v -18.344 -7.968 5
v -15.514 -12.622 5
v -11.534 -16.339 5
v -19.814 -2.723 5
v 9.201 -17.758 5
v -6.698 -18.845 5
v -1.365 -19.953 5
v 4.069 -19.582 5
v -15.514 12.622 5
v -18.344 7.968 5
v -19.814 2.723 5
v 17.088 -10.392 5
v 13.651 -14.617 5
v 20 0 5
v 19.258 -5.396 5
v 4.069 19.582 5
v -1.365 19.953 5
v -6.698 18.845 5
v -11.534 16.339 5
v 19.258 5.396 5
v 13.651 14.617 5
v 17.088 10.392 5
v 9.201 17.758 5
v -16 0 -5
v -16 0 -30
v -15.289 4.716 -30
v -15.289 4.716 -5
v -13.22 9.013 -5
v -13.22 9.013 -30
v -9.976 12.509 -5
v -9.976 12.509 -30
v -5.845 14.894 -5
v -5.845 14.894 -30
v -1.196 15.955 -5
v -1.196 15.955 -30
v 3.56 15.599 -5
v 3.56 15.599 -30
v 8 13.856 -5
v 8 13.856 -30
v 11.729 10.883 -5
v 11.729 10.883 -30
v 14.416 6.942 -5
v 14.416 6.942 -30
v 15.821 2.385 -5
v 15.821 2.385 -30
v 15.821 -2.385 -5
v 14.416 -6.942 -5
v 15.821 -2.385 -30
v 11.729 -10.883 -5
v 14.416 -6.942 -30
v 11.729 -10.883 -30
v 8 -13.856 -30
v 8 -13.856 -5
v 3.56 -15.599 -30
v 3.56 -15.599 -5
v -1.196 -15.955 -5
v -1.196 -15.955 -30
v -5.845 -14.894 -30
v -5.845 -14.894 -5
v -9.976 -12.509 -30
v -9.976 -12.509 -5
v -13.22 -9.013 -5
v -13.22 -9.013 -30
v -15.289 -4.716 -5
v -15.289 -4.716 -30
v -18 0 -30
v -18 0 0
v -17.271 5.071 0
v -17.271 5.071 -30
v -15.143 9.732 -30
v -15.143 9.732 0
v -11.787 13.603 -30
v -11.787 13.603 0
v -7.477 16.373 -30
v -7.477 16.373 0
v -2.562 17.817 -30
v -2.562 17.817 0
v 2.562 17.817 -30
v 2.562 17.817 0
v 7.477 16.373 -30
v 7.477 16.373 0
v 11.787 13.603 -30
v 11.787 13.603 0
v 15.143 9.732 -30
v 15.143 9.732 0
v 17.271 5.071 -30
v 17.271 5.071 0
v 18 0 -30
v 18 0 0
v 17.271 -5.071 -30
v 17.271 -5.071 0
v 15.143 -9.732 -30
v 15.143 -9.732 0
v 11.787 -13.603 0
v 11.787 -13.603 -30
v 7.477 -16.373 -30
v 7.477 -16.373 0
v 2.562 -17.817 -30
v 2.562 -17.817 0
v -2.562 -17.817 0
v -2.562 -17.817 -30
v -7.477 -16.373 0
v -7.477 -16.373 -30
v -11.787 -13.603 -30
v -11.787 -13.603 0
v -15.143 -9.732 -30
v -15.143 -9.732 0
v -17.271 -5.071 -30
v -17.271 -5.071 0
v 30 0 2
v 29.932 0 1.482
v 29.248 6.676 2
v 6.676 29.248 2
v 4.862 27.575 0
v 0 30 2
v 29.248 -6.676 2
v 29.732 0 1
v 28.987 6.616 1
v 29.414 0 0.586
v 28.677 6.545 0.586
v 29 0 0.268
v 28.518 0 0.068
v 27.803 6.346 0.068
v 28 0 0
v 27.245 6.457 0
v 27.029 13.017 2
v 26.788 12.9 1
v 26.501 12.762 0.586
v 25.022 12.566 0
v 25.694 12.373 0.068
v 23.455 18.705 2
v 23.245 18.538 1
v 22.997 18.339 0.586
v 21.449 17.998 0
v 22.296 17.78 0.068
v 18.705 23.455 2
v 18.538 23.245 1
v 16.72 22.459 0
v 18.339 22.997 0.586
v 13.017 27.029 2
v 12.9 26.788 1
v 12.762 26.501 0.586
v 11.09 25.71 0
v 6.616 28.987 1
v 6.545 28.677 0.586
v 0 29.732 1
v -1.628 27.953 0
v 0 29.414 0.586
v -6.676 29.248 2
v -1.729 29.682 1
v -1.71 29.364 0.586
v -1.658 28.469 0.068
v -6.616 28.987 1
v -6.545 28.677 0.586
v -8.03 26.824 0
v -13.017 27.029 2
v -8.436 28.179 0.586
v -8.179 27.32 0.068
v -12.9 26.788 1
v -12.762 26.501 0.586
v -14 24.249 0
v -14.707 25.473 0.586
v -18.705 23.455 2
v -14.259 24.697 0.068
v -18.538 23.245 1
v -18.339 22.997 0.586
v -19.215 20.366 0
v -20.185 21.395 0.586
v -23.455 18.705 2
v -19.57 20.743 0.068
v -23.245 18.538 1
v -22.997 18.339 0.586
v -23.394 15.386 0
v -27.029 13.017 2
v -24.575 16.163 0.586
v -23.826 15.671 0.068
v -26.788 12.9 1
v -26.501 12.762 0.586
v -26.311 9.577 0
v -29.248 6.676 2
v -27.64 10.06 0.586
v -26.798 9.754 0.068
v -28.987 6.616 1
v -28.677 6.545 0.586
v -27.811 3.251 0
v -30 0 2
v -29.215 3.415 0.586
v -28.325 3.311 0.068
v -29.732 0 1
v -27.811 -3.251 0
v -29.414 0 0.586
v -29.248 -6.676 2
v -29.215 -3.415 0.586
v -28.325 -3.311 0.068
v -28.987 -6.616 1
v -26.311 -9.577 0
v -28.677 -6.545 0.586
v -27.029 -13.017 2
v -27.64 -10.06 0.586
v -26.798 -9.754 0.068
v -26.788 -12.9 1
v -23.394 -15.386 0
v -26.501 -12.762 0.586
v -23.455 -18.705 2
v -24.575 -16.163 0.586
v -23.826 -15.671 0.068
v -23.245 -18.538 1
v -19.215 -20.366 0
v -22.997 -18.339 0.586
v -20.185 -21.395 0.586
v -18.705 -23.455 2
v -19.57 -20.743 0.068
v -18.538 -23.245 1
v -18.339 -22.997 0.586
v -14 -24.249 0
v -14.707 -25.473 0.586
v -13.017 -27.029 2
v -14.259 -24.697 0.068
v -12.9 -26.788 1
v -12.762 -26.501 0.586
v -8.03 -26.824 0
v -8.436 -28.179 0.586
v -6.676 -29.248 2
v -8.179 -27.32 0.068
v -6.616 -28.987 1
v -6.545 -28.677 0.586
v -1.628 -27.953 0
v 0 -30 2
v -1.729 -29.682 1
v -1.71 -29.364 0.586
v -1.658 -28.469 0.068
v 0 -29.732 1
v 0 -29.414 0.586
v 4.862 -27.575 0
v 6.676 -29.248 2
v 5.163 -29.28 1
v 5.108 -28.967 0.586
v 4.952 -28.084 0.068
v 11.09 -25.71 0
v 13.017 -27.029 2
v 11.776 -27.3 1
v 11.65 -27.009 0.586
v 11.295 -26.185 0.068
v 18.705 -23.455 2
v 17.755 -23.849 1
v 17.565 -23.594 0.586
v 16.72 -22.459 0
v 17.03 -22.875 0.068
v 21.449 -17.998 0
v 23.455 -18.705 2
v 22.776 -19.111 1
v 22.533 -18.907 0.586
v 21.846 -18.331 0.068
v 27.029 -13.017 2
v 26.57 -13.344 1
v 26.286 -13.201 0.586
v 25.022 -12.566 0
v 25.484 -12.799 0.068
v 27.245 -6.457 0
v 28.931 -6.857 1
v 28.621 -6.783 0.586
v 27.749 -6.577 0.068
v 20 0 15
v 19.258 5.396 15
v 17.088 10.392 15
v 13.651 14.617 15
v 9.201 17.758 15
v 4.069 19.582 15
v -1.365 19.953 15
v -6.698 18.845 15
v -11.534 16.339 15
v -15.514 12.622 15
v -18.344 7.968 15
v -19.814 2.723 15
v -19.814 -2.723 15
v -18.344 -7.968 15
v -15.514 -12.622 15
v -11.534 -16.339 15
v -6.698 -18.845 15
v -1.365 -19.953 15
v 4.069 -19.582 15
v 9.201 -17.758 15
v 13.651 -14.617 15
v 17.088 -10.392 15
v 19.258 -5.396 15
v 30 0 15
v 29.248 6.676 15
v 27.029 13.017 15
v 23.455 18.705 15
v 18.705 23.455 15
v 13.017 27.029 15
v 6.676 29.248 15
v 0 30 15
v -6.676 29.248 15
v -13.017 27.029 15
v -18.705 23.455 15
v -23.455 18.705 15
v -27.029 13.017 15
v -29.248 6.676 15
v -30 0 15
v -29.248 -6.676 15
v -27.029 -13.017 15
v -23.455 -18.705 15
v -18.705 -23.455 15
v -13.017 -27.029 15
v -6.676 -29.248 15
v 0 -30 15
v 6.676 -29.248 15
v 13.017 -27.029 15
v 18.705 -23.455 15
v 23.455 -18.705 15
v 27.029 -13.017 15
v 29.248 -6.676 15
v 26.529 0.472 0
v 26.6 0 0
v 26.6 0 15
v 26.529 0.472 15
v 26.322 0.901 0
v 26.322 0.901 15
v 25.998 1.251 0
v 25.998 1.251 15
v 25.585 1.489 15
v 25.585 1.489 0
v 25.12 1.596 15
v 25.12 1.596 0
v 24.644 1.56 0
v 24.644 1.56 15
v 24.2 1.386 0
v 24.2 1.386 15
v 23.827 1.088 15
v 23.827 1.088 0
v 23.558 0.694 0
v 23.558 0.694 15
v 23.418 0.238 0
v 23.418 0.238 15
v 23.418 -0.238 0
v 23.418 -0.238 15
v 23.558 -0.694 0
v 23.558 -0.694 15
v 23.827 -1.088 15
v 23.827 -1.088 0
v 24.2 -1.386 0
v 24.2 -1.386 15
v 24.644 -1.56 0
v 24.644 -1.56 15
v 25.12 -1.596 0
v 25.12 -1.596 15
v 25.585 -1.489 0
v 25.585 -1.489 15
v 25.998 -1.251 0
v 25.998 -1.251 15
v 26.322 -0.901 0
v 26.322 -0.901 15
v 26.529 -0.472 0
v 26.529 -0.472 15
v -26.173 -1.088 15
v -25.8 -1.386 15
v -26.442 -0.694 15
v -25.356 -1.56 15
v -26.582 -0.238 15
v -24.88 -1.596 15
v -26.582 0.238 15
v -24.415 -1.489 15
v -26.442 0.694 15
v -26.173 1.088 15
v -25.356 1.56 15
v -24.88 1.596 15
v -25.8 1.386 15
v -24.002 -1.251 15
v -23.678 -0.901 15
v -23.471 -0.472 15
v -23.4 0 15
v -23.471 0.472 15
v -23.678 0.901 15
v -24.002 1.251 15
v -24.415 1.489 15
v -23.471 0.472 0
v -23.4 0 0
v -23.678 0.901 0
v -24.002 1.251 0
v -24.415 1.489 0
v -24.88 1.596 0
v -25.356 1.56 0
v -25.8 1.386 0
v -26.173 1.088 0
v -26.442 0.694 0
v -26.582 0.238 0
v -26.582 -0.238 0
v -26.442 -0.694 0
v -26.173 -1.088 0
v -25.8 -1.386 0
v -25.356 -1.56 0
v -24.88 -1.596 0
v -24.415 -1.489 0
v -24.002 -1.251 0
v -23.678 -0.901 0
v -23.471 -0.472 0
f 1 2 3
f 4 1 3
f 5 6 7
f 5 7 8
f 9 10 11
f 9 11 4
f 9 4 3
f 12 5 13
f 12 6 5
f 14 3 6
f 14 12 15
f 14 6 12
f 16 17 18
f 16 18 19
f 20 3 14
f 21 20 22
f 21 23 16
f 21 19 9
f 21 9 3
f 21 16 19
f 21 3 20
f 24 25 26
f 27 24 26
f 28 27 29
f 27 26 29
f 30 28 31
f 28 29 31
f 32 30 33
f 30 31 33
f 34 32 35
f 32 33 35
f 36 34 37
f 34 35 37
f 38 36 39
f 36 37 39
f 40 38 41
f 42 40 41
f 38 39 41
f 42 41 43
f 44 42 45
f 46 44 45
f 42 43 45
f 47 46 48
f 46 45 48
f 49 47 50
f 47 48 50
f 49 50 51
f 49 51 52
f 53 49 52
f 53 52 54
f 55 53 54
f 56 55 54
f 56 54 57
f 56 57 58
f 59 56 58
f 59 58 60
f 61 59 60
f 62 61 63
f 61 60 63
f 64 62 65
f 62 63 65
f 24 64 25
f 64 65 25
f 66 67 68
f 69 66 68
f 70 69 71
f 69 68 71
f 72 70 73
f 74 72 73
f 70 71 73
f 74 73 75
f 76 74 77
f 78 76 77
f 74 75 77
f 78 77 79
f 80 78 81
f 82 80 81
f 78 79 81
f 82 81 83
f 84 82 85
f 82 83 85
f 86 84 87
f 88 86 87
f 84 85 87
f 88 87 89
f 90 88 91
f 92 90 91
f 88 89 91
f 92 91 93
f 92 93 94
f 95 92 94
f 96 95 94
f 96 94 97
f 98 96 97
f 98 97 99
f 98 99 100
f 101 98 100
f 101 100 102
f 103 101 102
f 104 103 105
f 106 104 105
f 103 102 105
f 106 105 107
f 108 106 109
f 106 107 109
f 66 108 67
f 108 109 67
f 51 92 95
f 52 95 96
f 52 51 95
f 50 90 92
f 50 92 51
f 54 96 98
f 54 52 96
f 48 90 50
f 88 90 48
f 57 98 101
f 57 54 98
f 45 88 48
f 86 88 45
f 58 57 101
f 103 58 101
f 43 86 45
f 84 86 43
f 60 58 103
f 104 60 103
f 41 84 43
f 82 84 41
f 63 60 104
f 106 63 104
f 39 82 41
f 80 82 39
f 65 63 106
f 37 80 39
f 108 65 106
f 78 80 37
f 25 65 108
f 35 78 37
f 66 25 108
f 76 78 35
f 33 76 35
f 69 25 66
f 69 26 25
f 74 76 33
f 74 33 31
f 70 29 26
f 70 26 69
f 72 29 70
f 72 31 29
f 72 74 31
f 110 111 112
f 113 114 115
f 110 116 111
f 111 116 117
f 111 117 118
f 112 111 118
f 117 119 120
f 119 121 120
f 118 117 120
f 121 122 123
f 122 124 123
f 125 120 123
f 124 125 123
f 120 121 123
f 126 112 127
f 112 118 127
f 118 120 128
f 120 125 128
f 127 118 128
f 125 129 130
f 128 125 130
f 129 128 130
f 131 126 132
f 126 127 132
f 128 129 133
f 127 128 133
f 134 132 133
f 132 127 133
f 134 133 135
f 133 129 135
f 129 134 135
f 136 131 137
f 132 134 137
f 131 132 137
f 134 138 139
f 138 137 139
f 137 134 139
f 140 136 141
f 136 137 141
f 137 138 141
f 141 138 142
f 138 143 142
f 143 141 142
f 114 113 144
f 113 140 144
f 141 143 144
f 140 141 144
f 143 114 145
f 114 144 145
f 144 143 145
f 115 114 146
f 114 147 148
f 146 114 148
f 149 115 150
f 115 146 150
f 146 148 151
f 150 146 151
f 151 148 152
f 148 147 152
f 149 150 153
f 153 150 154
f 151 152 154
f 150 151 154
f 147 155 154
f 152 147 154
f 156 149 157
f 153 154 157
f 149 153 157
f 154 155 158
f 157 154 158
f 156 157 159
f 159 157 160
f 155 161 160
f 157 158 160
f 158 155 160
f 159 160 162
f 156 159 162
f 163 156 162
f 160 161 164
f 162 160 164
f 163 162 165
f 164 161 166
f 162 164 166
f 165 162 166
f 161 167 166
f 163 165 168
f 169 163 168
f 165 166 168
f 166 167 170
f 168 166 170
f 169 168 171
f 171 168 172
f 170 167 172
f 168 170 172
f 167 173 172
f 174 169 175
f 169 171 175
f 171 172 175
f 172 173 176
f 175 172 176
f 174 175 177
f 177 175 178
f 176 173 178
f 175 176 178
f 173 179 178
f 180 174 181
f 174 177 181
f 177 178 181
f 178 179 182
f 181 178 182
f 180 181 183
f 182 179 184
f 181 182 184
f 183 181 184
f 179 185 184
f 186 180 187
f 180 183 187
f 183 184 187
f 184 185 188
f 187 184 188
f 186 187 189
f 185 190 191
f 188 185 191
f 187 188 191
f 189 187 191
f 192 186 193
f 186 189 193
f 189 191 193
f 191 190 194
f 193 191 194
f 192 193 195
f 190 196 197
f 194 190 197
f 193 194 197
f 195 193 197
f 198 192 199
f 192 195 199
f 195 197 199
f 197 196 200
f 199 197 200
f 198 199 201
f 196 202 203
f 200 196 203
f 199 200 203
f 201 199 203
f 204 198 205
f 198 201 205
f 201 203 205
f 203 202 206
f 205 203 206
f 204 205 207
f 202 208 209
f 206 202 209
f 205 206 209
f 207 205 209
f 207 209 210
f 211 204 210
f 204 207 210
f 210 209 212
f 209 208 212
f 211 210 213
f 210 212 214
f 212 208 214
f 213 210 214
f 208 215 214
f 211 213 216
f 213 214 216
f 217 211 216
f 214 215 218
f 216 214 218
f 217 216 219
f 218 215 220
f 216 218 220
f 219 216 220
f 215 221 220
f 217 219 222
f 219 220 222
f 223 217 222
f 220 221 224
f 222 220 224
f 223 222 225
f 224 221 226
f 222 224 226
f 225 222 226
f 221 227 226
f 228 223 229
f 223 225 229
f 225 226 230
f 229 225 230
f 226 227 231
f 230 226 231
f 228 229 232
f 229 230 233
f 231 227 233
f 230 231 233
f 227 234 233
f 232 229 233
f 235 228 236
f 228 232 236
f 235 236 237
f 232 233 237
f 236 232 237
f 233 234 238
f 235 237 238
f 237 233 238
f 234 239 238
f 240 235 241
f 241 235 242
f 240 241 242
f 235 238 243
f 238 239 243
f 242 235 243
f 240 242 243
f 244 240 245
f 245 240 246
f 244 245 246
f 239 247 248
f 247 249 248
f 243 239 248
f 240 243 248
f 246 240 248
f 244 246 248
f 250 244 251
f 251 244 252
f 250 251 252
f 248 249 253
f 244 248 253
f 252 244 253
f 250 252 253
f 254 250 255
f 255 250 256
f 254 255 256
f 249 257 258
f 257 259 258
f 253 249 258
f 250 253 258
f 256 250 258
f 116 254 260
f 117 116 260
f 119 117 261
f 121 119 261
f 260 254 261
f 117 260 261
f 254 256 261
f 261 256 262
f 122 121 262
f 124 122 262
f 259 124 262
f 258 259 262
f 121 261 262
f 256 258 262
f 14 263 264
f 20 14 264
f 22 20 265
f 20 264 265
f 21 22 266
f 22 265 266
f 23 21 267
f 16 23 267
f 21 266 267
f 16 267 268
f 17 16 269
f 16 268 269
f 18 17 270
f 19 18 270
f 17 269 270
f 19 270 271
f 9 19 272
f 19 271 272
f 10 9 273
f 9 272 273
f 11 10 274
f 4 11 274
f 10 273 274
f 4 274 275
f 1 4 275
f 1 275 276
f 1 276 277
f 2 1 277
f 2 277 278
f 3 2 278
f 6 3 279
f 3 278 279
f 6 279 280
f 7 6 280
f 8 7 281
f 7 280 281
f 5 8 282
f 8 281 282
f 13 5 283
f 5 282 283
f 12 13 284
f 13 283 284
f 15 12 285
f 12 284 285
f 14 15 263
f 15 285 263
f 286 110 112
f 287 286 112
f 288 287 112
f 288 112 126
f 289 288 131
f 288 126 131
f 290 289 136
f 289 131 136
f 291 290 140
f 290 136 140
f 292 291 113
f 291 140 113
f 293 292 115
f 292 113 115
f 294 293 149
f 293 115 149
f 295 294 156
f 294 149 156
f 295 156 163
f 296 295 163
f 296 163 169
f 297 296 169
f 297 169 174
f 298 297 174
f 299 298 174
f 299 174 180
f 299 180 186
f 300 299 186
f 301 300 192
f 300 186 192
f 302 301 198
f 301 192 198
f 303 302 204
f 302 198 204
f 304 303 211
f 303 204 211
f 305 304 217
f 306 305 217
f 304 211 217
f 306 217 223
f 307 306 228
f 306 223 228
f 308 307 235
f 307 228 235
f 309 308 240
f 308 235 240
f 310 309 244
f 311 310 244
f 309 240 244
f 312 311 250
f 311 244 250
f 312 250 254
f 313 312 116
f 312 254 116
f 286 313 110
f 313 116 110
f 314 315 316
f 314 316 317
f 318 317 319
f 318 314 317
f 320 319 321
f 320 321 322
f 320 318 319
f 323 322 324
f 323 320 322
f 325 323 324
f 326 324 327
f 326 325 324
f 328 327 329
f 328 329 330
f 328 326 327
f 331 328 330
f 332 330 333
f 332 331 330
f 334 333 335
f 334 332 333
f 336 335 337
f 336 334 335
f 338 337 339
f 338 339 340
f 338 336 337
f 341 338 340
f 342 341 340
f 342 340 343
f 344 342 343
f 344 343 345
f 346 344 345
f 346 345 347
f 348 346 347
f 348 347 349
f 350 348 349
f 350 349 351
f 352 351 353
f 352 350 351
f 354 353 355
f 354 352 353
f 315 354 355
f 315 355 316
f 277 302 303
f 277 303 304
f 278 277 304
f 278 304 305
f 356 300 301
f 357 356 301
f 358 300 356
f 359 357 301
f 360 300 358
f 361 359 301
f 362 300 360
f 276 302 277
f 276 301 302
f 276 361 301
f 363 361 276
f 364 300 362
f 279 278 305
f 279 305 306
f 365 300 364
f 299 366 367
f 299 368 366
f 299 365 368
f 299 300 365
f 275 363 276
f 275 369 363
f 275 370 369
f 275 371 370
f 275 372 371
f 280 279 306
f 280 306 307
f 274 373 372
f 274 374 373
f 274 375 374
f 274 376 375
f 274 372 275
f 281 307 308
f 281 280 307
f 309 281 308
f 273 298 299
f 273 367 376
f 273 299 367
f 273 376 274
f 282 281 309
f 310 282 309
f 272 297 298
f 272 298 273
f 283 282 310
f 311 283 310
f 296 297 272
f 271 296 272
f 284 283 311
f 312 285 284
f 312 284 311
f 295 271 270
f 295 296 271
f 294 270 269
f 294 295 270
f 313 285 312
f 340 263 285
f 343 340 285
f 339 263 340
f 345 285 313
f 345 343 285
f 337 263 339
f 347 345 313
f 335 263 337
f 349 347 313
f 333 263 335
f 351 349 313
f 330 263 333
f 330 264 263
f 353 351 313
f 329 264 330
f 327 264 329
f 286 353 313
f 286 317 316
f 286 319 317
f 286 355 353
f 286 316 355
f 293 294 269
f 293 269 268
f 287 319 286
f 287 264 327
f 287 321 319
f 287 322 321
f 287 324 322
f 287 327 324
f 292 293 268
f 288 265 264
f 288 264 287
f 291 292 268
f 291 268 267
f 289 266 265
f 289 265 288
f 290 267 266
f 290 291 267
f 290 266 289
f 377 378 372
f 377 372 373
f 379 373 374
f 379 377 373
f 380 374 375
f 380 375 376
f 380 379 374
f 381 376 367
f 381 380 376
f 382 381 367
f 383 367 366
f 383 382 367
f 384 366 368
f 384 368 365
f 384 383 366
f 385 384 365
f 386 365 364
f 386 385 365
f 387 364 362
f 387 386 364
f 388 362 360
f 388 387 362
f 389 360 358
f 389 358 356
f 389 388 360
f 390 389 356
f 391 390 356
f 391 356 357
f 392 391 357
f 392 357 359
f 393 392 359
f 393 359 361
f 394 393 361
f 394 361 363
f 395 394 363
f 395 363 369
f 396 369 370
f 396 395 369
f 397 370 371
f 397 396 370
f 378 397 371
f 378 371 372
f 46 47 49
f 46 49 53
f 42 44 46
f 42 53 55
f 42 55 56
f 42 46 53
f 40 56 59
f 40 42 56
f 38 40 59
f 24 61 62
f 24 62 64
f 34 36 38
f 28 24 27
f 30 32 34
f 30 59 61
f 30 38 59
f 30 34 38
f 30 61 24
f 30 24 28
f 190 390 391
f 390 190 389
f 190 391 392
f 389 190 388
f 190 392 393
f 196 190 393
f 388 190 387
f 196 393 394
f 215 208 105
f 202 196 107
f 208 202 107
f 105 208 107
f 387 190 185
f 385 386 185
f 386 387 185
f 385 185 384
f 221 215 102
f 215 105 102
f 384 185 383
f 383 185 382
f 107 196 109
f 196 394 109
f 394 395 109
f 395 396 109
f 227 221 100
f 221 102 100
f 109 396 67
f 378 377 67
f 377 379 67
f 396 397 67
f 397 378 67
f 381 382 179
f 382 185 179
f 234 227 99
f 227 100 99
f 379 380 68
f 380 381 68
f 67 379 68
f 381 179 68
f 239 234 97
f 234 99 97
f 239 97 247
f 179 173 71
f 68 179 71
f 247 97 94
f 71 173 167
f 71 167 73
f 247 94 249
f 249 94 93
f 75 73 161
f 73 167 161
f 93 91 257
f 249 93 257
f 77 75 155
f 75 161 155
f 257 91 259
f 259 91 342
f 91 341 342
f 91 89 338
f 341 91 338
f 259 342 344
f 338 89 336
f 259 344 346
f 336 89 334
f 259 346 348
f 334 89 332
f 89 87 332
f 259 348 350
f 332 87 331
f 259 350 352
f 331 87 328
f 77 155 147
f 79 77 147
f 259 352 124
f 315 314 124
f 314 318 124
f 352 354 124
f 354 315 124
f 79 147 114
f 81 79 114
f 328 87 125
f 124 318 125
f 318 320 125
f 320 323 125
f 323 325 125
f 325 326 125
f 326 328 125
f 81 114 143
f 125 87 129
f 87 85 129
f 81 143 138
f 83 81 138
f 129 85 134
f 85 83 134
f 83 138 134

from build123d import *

# Parameters (mm, degrees)
SKETCH1_R           = 30
SKETCH1_R_2         = 1.6
BOSS_EXTRUDE1_DEPTH = 15
SKETCH2_R           = 20
CUT_EXTRUDE1_DEPTH  = 10
SKETCH3_R           = 18
BOSS_EXTRUDE2_DEPTH = 30
SKETCH4_R           = 16
CUT_EXTRUDE2_DEPTH  = 25
FILLET2_R           = 2


with BuildPart() as part:
    # Sketch1 → Boss-Extrude1 (new body)
    with BuildSketch(Plane.XY):
        Circle(SKETCH1_R)
        with Locations((-25, 0)):
            Circle(SKETCH1_R_2, mode=Mode.SUBTRACT)
        with Locations((25, 0)):
            Circle(SKETCH1_R_2, mode=Mode.SUBTRACT)
    extrude(amount=BOSS_EXTRUDE1_DEPTH)

    # Sketch2 → Cut-Extrude1 (cut)
    with BuildSketch(Plane.XY.offset(15)):
        Circle(SKETCH2_R)
    extrude(amount=-CUT_EXTRUDE1_DEPTH, mode=Mode.SUBTRACT)

    # Sketch3 → Boss-Extrude2 (add)
    with BuildSketch(Plane(origin=(0, 0, 0), x_dir=(-1, 0, 0), z_dir=(0, 0, -1))):
        Circle(SKETCH3_R)
    extrude(amount=BOSS_EXTRUDE2_DEPTH)

    # Sketch4 → Cut-Extrude2 (cut)
    with BuildSketch(Plane(origin=(0, 0, -30), x_dir=(-1, 0, 0), z_dir=(0, 0, -1))):
        Circle(SKETCH4_R)
    extrude(amount=-CUT_EXTRUDE2_DEPTH, mode=Mode.SUBTRACT)

    # Fillet2
    fillet2_edges = [part.edges().sort_by_distance(p)[0] for p in [
        (-30, 0, 0),
    ]]
    fillet(fillet2_edges, radius=FILLET2_R)


solid = part.part
